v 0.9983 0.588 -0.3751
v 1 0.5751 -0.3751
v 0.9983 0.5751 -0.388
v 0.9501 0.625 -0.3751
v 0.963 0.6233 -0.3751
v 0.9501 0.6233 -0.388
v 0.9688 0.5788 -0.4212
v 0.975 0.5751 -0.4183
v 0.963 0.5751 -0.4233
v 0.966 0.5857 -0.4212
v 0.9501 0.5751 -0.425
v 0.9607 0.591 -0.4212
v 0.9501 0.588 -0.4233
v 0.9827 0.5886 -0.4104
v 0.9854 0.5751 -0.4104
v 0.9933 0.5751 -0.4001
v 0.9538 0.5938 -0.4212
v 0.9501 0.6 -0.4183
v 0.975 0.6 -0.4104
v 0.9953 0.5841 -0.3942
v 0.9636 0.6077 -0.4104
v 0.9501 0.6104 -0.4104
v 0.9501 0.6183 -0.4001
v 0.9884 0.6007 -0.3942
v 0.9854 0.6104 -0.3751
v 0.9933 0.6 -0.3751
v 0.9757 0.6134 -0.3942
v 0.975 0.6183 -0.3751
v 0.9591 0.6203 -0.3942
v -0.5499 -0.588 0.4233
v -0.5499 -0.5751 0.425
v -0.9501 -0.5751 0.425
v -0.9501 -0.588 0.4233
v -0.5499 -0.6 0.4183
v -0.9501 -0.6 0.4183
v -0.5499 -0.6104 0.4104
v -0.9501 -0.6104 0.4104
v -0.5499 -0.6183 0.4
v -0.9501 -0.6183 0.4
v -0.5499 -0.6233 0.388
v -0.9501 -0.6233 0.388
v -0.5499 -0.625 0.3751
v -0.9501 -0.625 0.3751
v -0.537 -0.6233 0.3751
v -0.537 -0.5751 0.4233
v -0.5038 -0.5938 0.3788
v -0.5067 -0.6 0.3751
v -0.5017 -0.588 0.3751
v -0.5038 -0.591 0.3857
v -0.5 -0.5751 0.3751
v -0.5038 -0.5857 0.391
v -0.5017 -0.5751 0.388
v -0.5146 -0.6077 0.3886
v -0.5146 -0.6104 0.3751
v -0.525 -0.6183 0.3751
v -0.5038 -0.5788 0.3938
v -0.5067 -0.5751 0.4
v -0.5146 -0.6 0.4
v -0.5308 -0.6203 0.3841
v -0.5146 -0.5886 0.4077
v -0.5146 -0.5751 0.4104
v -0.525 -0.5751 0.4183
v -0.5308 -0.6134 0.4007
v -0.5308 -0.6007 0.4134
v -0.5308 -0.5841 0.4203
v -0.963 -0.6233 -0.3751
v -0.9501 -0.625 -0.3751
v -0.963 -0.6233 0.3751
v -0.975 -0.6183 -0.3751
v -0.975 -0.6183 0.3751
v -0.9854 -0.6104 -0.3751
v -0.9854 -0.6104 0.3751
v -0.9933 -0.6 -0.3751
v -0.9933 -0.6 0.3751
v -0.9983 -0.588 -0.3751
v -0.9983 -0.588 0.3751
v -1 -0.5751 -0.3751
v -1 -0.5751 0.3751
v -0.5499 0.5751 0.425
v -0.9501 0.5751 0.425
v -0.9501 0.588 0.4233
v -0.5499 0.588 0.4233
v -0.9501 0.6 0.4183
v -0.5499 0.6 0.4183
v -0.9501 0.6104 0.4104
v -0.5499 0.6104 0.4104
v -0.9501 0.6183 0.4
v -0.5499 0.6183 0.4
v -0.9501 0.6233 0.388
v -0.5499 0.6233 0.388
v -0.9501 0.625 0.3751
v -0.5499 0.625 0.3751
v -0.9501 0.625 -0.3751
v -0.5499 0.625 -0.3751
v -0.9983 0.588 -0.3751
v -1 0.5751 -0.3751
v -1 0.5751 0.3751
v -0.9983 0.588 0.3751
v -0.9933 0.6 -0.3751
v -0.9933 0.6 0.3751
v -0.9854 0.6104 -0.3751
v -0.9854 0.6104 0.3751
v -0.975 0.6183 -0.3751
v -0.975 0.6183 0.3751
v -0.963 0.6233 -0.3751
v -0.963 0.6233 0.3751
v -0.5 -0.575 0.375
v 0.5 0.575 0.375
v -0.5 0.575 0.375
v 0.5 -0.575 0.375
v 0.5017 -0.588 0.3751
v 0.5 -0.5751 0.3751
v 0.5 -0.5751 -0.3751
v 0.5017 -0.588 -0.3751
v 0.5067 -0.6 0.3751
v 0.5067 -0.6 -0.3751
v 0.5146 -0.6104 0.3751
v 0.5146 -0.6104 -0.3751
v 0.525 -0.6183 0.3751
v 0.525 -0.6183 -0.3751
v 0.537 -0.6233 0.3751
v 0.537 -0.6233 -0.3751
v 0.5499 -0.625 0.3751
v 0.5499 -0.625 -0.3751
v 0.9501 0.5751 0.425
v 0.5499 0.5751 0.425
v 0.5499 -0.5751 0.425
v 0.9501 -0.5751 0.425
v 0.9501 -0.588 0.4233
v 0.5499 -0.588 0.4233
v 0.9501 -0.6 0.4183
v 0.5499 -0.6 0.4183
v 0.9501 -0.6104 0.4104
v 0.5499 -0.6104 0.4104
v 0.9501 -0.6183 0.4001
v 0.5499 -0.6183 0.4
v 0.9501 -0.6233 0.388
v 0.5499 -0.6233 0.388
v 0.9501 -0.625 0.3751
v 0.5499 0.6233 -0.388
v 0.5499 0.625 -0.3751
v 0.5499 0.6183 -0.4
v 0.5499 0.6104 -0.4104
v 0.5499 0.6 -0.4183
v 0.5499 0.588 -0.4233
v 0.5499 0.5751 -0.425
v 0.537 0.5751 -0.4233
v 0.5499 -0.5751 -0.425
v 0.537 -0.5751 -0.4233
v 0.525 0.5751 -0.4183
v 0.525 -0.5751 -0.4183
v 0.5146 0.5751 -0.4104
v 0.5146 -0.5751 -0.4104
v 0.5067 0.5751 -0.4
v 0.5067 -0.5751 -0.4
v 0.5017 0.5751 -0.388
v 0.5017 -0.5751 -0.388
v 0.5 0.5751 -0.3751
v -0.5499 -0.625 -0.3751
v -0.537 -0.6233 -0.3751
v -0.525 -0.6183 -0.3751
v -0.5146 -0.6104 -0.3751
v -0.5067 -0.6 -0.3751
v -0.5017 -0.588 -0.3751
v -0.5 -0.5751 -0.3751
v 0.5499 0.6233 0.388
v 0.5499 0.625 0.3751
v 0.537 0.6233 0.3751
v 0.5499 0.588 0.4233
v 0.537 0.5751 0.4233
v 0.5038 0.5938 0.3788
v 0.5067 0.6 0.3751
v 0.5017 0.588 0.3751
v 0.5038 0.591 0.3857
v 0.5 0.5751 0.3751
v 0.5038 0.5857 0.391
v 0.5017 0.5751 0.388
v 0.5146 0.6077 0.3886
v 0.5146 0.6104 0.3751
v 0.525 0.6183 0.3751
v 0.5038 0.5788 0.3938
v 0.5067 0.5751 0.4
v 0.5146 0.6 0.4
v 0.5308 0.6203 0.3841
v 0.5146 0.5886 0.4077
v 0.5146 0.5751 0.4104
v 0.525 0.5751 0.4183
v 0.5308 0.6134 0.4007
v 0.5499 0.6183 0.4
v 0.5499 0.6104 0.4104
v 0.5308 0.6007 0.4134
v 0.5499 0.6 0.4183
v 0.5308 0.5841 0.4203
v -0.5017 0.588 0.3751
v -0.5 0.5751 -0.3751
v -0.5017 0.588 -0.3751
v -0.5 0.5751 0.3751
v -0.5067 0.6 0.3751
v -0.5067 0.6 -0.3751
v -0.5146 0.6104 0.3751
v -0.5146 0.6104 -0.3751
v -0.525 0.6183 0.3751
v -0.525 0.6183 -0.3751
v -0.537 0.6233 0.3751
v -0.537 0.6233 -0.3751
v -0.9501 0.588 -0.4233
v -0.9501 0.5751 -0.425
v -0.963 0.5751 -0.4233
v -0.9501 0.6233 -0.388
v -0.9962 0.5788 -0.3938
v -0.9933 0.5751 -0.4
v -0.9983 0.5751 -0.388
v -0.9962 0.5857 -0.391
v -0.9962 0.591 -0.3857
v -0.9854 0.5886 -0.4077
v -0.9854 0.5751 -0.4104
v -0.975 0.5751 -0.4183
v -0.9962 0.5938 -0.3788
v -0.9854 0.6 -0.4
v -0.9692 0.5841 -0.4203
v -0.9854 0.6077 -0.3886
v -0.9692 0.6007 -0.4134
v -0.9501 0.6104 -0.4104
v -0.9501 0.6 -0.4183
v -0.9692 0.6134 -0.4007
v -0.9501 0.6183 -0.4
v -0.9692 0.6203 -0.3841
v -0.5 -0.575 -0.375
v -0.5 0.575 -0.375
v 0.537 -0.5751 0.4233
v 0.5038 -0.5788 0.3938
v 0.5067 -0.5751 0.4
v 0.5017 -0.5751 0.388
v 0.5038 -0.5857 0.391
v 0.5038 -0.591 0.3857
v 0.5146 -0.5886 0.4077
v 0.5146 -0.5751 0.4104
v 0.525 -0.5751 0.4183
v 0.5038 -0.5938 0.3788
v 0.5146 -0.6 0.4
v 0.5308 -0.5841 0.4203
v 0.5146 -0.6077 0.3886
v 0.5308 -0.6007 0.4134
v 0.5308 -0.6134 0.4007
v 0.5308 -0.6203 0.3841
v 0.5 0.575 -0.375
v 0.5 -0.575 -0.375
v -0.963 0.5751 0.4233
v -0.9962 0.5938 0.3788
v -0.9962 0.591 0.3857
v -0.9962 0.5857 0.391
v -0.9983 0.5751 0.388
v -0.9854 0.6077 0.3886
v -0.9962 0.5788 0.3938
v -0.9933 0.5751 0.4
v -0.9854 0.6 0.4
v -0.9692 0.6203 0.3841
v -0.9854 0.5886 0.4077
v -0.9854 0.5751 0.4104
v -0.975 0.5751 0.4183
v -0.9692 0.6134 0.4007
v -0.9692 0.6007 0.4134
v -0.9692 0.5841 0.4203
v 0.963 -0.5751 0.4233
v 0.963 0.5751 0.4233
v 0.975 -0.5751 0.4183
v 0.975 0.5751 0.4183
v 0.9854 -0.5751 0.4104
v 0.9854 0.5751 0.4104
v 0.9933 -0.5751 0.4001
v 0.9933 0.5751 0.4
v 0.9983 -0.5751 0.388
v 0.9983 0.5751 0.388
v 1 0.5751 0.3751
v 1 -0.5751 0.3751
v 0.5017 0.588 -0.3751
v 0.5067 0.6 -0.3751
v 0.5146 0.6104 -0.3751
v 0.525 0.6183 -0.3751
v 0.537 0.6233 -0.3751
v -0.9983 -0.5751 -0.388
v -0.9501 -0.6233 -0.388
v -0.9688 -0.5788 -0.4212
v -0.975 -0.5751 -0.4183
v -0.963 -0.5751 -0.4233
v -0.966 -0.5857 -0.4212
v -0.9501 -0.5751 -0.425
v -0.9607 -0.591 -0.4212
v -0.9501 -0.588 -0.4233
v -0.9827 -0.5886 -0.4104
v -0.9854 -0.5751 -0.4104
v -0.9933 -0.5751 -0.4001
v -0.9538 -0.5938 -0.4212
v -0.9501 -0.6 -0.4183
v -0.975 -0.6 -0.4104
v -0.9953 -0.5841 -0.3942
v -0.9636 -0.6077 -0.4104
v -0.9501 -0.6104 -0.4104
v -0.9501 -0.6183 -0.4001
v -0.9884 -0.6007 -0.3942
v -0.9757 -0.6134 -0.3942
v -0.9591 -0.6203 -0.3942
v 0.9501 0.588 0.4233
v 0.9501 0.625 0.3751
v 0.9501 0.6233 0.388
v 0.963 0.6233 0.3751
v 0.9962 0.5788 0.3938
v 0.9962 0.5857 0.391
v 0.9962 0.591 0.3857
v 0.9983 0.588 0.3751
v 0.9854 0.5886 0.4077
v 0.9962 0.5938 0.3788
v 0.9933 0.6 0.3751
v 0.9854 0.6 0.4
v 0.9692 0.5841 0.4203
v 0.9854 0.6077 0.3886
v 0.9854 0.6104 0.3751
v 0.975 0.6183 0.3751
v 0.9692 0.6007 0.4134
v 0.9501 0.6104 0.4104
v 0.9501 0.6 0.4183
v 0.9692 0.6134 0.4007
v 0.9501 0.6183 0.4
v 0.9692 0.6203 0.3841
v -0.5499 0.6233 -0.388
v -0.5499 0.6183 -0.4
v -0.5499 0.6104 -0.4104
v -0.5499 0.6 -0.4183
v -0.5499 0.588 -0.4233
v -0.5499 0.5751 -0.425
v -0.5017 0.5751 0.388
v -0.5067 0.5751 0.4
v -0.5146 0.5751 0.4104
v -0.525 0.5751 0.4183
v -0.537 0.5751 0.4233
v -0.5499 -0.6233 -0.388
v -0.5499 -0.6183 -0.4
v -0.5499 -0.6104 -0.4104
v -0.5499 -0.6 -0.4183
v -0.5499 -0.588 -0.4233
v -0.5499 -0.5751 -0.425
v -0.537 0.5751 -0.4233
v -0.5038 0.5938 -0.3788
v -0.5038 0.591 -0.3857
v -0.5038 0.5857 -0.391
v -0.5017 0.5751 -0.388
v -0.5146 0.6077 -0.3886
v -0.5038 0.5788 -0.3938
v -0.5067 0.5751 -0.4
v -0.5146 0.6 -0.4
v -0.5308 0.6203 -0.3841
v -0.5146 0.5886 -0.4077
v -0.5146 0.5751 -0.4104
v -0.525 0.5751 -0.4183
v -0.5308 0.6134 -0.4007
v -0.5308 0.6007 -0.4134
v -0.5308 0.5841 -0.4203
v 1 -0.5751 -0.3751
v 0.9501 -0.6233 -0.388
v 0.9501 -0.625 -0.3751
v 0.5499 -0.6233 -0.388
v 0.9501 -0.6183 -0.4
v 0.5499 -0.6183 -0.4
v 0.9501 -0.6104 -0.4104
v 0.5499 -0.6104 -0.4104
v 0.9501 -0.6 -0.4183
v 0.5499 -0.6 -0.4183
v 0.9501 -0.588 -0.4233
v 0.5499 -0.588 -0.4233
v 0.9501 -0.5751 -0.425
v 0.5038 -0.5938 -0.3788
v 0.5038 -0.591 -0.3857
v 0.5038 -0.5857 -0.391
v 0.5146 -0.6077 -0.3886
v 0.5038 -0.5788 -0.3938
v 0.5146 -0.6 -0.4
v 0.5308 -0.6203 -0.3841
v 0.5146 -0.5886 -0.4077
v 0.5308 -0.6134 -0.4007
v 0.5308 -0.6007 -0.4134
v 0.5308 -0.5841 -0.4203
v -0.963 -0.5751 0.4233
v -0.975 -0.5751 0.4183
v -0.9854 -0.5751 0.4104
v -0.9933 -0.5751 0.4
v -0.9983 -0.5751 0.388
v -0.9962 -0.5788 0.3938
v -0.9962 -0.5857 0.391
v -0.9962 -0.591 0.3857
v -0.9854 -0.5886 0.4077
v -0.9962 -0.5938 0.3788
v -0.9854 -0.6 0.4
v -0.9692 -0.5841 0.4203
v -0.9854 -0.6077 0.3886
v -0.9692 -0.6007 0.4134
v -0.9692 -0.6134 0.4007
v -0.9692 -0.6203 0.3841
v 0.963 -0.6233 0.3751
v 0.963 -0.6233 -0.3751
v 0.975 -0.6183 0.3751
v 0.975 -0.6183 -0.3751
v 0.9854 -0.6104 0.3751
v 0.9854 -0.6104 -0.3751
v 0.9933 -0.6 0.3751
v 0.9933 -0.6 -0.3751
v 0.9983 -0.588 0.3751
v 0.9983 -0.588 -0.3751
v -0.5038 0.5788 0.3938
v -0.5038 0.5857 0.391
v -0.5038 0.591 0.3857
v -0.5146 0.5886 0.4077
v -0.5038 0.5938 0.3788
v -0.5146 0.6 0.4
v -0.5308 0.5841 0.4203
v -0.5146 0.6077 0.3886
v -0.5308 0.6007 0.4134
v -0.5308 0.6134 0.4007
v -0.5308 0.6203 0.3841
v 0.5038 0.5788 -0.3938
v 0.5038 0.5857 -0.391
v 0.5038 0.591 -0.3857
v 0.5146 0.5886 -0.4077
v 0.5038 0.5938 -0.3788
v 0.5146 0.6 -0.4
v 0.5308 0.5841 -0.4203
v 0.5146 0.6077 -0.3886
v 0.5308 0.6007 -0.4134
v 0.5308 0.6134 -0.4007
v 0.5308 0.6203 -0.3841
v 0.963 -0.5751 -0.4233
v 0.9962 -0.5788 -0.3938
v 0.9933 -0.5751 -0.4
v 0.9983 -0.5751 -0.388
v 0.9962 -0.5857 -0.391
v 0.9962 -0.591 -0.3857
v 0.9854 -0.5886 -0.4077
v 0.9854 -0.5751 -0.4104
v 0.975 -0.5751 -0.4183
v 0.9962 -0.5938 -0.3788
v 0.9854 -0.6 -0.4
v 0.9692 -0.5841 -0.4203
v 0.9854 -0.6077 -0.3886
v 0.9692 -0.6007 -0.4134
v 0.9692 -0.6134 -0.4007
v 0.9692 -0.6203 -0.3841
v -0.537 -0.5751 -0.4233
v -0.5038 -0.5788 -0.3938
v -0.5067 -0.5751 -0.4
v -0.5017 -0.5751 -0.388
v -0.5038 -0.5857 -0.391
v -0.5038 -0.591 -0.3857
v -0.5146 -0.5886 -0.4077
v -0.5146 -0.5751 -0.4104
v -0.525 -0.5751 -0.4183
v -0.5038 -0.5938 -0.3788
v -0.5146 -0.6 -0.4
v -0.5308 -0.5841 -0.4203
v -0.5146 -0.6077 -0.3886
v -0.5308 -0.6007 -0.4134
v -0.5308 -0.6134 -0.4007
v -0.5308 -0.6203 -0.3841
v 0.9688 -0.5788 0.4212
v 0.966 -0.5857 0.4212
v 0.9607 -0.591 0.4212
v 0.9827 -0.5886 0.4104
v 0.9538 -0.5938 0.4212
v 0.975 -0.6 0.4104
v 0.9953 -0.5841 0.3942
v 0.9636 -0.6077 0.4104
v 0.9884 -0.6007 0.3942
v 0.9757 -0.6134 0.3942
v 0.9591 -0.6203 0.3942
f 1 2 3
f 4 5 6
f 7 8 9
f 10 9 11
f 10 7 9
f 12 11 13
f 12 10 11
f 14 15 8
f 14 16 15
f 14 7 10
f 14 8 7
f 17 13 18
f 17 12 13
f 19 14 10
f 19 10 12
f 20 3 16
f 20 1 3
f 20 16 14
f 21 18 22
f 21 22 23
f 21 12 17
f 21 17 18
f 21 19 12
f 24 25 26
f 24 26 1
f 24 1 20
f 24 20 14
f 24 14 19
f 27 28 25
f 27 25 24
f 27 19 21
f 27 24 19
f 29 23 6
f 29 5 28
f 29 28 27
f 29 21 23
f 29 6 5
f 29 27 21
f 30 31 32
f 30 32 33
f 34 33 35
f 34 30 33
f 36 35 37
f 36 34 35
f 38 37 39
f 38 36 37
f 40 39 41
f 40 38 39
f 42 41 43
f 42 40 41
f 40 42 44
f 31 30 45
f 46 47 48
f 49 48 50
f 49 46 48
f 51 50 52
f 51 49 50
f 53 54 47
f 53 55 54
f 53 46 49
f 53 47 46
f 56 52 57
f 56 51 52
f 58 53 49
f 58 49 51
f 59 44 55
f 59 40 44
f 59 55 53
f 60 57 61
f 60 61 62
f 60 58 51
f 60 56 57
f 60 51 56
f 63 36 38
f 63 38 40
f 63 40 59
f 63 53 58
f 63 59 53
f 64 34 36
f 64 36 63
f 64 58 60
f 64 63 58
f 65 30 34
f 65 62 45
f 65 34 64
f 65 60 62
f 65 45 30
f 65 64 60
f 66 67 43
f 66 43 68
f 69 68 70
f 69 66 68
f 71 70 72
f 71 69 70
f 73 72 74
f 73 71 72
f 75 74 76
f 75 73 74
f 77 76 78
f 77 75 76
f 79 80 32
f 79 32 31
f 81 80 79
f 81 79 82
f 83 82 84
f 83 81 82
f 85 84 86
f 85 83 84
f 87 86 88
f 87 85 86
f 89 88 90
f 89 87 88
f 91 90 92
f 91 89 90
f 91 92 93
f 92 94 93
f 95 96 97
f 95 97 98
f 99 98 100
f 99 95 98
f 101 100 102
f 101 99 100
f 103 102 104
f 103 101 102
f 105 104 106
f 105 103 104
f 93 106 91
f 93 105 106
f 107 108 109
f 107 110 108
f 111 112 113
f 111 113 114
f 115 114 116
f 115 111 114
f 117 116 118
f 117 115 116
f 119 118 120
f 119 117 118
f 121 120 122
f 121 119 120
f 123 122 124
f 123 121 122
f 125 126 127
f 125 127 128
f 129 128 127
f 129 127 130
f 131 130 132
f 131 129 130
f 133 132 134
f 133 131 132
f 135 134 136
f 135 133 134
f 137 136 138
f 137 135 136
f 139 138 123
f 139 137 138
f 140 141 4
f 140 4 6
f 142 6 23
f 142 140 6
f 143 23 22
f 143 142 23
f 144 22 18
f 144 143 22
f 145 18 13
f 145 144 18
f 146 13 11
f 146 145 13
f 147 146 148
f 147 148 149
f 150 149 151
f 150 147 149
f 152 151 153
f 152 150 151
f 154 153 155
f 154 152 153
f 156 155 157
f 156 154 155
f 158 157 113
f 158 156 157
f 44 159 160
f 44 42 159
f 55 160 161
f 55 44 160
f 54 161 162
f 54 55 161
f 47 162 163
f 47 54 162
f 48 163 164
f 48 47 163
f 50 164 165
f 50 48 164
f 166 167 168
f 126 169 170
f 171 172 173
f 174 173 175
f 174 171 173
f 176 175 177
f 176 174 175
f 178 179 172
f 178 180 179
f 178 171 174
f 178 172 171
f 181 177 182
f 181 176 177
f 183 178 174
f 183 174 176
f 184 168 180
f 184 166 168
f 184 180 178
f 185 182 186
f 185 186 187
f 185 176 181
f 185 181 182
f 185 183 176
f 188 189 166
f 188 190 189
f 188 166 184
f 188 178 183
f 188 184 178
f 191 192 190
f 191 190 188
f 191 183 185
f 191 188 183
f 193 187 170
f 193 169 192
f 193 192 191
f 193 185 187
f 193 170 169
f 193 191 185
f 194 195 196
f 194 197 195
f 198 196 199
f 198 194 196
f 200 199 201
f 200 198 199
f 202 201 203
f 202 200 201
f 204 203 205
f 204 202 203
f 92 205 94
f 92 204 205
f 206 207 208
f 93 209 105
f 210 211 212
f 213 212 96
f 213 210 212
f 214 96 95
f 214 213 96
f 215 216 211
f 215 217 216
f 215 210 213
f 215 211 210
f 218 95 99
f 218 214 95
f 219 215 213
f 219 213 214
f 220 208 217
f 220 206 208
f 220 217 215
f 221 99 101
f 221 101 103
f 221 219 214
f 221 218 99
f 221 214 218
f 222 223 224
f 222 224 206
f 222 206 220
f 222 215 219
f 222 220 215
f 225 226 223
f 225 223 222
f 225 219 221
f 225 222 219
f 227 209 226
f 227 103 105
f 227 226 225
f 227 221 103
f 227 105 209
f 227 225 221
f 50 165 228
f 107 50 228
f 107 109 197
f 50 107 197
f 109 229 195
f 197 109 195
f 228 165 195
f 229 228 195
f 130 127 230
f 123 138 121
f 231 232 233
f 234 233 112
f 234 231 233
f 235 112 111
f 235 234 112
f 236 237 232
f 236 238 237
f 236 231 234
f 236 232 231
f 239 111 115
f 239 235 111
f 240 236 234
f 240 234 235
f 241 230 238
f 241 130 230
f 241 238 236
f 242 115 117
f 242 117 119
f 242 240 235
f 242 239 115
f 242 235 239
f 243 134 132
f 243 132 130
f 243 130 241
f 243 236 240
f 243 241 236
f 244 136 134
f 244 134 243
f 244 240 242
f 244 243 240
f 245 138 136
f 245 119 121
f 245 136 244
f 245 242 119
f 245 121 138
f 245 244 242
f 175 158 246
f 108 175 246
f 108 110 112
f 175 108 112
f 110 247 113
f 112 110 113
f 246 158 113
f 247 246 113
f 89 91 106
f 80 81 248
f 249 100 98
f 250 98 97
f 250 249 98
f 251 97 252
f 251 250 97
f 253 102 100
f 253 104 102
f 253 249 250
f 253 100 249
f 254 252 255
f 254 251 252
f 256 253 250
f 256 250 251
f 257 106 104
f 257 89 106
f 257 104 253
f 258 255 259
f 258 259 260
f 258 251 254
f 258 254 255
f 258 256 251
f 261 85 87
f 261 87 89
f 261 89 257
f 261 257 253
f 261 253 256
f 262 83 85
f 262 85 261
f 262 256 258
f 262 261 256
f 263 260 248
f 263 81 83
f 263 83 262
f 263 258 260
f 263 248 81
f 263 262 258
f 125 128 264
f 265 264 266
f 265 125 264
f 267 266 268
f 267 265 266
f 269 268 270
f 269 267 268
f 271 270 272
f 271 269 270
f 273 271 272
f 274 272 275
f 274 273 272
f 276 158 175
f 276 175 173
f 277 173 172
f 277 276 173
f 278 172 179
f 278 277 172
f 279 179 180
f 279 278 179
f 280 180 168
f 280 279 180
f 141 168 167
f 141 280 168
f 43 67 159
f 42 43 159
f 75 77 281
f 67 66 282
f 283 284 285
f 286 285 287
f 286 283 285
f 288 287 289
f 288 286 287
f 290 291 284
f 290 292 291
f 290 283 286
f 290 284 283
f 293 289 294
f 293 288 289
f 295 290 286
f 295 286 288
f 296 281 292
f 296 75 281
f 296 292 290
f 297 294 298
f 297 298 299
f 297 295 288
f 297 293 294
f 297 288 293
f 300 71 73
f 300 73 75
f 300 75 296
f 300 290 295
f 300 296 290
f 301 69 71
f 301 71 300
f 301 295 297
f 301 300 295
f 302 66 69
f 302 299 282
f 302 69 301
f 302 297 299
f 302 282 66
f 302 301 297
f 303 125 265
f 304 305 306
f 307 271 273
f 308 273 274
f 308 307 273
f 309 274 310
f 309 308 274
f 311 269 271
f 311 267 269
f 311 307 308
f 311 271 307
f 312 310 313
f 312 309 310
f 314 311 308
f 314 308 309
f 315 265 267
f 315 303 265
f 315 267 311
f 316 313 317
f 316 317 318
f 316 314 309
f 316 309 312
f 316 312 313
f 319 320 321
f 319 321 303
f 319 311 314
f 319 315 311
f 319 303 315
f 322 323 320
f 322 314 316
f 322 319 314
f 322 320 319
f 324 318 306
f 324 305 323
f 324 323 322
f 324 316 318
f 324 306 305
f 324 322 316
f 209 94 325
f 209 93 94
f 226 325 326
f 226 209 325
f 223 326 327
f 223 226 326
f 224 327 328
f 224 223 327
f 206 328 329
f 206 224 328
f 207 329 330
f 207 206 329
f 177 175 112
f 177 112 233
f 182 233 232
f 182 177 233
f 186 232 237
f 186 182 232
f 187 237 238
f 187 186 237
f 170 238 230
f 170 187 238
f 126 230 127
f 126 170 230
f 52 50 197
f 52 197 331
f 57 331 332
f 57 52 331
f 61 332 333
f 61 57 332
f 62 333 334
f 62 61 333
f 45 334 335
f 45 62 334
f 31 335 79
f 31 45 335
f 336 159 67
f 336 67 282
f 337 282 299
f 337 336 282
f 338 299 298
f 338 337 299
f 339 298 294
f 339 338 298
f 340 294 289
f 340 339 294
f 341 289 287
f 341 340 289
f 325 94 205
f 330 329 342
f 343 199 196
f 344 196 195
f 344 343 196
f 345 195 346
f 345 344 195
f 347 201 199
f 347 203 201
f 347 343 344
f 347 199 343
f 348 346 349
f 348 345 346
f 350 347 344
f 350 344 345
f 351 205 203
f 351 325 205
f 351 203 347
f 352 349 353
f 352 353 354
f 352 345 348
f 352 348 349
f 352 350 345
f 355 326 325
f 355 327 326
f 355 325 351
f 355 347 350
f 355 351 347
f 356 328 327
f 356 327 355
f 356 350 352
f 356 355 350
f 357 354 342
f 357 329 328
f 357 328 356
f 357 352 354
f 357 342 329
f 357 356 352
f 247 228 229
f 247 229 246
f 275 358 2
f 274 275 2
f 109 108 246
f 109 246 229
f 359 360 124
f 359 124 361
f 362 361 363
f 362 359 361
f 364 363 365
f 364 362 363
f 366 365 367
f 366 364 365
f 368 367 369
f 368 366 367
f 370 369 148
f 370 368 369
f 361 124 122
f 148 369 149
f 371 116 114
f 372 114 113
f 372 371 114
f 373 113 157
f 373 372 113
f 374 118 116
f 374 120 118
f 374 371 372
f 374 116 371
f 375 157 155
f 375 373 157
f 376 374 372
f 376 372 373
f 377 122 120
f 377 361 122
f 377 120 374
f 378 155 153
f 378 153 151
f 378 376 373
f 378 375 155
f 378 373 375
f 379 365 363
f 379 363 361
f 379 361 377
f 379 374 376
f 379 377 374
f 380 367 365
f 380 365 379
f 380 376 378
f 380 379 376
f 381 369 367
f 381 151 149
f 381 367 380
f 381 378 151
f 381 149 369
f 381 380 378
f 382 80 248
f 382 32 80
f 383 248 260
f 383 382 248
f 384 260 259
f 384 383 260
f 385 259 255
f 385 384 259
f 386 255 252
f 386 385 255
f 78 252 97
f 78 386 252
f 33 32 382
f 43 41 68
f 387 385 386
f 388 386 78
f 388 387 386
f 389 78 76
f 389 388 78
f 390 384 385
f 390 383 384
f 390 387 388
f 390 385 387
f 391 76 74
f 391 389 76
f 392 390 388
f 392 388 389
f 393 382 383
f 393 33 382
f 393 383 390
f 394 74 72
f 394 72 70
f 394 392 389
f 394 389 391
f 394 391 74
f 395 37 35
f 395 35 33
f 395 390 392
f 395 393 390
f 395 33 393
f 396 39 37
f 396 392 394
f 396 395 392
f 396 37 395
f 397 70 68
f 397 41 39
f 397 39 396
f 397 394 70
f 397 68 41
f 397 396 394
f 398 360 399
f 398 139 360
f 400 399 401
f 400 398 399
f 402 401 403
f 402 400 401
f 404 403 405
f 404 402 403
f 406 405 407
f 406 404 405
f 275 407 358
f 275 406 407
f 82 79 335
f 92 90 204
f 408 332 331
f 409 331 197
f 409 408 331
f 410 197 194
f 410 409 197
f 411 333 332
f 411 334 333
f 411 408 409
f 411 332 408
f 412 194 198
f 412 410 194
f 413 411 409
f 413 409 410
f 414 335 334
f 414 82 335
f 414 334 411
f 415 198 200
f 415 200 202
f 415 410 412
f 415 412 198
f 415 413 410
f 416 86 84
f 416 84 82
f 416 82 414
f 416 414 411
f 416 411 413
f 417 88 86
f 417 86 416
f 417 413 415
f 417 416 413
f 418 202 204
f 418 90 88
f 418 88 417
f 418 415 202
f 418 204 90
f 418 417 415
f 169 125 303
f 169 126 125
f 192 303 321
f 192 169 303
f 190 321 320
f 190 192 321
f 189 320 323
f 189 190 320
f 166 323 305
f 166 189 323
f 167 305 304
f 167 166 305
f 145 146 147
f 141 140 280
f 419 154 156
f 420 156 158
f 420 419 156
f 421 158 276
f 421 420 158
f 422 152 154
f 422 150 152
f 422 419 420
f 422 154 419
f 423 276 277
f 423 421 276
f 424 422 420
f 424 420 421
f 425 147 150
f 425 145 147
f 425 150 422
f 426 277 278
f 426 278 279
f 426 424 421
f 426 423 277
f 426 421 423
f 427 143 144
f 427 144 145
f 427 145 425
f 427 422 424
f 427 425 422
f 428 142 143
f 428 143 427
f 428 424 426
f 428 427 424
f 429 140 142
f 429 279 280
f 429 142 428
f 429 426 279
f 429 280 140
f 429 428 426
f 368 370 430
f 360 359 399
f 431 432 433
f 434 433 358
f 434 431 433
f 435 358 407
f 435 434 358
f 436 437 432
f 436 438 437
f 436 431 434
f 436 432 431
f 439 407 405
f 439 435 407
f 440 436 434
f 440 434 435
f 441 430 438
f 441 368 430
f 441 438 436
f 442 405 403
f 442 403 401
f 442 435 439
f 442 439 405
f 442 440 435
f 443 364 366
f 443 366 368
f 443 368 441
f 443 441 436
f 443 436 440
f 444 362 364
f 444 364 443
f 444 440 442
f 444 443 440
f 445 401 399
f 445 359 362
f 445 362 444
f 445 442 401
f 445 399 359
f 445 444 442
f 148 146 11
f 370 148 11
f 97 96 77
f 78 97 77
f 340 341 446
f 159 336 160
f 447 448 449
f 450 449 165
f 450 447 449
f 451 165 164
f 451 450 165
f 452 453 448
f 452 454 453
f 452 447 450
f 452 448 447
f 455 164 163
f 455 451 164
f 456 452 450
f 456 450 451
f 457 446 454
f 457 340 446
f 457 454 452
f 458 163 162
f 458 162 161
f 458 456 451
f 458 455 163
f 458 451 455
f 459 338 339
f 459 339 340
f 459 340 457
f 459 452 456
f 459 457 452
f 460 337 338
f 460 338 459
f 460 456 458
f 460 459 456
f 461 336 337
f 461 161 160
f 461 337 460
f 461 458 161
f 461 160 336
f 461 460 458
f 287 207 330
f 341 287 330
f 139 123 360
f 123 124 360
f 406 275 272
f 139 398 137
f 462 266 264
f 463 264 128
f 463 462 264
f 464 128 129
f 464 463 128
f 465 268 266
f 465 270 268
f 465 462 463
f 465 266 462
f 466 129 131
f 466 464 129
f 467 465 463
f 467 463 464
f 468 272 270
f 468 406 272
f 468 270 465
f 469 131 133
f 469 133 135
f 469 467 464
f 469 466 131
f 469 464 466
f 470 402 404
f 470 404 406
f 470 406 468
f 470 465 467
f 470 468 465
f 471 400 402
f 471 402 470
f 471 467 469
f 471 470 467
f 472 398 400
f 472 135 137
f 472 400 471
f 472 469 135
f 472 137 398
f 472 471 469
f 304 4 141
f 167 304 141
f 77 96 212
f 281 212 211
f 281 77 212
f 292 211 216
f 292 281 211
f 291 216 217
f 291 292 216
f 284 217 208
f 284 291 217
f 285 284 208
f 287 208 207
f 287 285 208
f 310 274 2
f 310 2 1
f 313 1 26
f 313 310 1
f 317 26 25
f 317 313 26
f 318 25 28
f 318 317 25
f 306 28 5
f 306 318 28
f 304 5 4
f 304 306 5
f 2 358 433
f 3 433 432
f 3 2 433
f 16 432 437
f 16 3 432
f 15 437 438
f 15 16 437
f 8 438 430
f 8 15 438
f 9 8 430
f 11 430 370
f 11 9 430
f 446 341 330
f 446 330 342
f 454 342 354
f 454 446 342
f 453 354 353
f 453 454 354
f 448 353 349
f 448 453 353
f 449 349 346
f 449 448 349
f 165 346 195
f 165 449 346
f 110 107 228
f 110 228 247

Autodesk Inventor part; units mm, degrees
ref_plane "YZ Plane" through (0, 0, 0) normal (1, 0, 0) x (0, 1, 0)
ref_plane "XZ Plane" through (0, 0, 0) normal (0, 1, 0) x (-1, 0, 0)
ref_plane "XY Plane" through (0, 0, 0) normal (0, 0, 1) x (1, 0, 0)
sketch "Sketch1" plane through (0, 0, 0) normal (0, 0, 1) x (1, 0, 0)
  line L0 (1, 0.625) -> (-1, 0.625)
  line L1 (-1, 0.625) -> (-1, -0.625)
  line L2 (-1, -0.625) -> (1, -0.625)
  line L3 (1, -0.625) -> (1, 0.625)
  line L4 (1, 0.625) -> (-1, -0.625) construction
  line L5 (-1, 0.625) -> (1, -0.625) construction
  point P0 (0, 0)
  point P1 (0, 0)
  point P2 (0, 0)
  dimension "d0" = 2
  dimension "d1" = 1.25
sketch "Sketch1 outline for Extrusion1" plane through (0, 0, 0) normal (0, 0, 1) x (1, 0, 0)
  line L0 (1, -0.625) -> (1, 0.625)
  line L1 (-1, -0.625) -> (1, -0.625)
  line L2 (-1, 0.625) -> (-1, -0.625)
  line L3 (1, 0.625) -> (-1, 0.625)
extrude "Extrusion1" add sketch "Sketch1 outline for Extrusion1" along normal mid plane 0.85
sketch "Sketch2" plane through (0, 0, 0.425) normal (0, 0, 1) x (-1, 0, 0)
  line L0 (0.5, 0.624281) -> (0.5, -0.625)
  line L1 (-0.5, 0.625) -> (-0.5, -0.625)
  line L2 (-0.5, 0.625) -> (0.5, 0.625)
  line L3 (0.5, 0.625) -> (0.5, -0.625)
  line L4 (0.5, -0.625) -> (-0.5, -0.625)
  line L5 (-0.5, -0.625) -> (-0.5, 0.625)
  line L6 (-1, -0.625) -> (1, -0.625)
  line L7 (1, 0.625) -> (-1, 0.625)
  line L8 (1, -0.625) -> (1, 0.625)
  line L9 (-1, 0.625) -> (-1, -0.625)
  point P0 (0, 0)
  dimension "d11" = 0.5
  dimension "d12" = 0.5
sketch "Sketch2 outline for Extrusion2" plane through (0, 0, 0.425) normal (0, 0, 1) x (-1, 0, 0)
  line L0 (-0.5, -0.625) -> (0.5, -0.625)
  line L1 (-0.5, 0.625) -> (-0.5, -0.625)
  line L2 (0.5, 0.625) -> (-0.5, 0.625)
  line L3 (0.5, -0.625) -> (0.5, 0.625)
extrude "Extrusion2" cut sketch "Sketch2 outline for Extrusion2" against normal blind 0.05
mirror "Mirror1" about plane through (0, 0, 0) normal (0, 0, 1) of "Extrusion2"
sketch "Sketch3" plane through (1, -0.625, -0.425) normal (0, -1, 0) x (1, 0, 0)
  line L0 (-1.5, 0.8) -> (-0.5, 0.8)
  line L1 (-0.5, 0.8) -> (-0.5, 0.05)
  line L2 (-0.5, 0.05) -> (-1.5, 0.05)
  line L3 (-1.5, 0.05) -> (-1.5, 0.8)
  point P0 (-1, 0.425)
sketch "Sketch3 outline for Extrusion3" plane through (1, -0.625, -0.425) normal (0, -1, 0) x (1, 0, 0)
  line L0 (-1.5, 0.8) -> (-0.5, 0.8)
  line L1 (-0.5, 0.8) -> (-0.5, 0.05)
  line L2 (-0.5, 0.05) -> (-1.5, 0.05)
  line L3 (-1.5, 0.05) -> (-1.5, 0.8)
extrude "Extrusion3" cut sketch "Sketch3 outline for Extrusion3" against normal blind 0.05
mirror "Mirror2" about plane through (0, 0, 0) normal (0, 1, 0) of "Extrusion3"
fillet "Fillet1" radius 0.05 24 edges at (0.75, 0.625, 0.425) (1, 0.625, 0) (0.75, 0.625, -0.425) (0.75, -0.625, -0.425) (1, -0.625, 0) (0.75, -0.625, 0.425) (-0.75, -0.625, 0.425) (-1, -0.625, 0) (-0.75, -0.625, -0.425) (1, 0, -0.425) (1, 0, 0.425) (-0.75, 0.625, 0.425) (-1, 0, 0.425) (-0.75, 0.625, -0.425) (-1, 0.625, 0) (-1, 0, -0.425) (-0.5, 0.625, 0) (-0.5, 0, 0.425) (-0.5, -0.625, 0) (-0.5, 0, -0.425) (0.5, 0.625, 0) (0.5, 0, -0.425) (0.5, -0.625, 0) (0.5, 0, 0.425)
properties part number "CL21F104ZBCNNNC"
